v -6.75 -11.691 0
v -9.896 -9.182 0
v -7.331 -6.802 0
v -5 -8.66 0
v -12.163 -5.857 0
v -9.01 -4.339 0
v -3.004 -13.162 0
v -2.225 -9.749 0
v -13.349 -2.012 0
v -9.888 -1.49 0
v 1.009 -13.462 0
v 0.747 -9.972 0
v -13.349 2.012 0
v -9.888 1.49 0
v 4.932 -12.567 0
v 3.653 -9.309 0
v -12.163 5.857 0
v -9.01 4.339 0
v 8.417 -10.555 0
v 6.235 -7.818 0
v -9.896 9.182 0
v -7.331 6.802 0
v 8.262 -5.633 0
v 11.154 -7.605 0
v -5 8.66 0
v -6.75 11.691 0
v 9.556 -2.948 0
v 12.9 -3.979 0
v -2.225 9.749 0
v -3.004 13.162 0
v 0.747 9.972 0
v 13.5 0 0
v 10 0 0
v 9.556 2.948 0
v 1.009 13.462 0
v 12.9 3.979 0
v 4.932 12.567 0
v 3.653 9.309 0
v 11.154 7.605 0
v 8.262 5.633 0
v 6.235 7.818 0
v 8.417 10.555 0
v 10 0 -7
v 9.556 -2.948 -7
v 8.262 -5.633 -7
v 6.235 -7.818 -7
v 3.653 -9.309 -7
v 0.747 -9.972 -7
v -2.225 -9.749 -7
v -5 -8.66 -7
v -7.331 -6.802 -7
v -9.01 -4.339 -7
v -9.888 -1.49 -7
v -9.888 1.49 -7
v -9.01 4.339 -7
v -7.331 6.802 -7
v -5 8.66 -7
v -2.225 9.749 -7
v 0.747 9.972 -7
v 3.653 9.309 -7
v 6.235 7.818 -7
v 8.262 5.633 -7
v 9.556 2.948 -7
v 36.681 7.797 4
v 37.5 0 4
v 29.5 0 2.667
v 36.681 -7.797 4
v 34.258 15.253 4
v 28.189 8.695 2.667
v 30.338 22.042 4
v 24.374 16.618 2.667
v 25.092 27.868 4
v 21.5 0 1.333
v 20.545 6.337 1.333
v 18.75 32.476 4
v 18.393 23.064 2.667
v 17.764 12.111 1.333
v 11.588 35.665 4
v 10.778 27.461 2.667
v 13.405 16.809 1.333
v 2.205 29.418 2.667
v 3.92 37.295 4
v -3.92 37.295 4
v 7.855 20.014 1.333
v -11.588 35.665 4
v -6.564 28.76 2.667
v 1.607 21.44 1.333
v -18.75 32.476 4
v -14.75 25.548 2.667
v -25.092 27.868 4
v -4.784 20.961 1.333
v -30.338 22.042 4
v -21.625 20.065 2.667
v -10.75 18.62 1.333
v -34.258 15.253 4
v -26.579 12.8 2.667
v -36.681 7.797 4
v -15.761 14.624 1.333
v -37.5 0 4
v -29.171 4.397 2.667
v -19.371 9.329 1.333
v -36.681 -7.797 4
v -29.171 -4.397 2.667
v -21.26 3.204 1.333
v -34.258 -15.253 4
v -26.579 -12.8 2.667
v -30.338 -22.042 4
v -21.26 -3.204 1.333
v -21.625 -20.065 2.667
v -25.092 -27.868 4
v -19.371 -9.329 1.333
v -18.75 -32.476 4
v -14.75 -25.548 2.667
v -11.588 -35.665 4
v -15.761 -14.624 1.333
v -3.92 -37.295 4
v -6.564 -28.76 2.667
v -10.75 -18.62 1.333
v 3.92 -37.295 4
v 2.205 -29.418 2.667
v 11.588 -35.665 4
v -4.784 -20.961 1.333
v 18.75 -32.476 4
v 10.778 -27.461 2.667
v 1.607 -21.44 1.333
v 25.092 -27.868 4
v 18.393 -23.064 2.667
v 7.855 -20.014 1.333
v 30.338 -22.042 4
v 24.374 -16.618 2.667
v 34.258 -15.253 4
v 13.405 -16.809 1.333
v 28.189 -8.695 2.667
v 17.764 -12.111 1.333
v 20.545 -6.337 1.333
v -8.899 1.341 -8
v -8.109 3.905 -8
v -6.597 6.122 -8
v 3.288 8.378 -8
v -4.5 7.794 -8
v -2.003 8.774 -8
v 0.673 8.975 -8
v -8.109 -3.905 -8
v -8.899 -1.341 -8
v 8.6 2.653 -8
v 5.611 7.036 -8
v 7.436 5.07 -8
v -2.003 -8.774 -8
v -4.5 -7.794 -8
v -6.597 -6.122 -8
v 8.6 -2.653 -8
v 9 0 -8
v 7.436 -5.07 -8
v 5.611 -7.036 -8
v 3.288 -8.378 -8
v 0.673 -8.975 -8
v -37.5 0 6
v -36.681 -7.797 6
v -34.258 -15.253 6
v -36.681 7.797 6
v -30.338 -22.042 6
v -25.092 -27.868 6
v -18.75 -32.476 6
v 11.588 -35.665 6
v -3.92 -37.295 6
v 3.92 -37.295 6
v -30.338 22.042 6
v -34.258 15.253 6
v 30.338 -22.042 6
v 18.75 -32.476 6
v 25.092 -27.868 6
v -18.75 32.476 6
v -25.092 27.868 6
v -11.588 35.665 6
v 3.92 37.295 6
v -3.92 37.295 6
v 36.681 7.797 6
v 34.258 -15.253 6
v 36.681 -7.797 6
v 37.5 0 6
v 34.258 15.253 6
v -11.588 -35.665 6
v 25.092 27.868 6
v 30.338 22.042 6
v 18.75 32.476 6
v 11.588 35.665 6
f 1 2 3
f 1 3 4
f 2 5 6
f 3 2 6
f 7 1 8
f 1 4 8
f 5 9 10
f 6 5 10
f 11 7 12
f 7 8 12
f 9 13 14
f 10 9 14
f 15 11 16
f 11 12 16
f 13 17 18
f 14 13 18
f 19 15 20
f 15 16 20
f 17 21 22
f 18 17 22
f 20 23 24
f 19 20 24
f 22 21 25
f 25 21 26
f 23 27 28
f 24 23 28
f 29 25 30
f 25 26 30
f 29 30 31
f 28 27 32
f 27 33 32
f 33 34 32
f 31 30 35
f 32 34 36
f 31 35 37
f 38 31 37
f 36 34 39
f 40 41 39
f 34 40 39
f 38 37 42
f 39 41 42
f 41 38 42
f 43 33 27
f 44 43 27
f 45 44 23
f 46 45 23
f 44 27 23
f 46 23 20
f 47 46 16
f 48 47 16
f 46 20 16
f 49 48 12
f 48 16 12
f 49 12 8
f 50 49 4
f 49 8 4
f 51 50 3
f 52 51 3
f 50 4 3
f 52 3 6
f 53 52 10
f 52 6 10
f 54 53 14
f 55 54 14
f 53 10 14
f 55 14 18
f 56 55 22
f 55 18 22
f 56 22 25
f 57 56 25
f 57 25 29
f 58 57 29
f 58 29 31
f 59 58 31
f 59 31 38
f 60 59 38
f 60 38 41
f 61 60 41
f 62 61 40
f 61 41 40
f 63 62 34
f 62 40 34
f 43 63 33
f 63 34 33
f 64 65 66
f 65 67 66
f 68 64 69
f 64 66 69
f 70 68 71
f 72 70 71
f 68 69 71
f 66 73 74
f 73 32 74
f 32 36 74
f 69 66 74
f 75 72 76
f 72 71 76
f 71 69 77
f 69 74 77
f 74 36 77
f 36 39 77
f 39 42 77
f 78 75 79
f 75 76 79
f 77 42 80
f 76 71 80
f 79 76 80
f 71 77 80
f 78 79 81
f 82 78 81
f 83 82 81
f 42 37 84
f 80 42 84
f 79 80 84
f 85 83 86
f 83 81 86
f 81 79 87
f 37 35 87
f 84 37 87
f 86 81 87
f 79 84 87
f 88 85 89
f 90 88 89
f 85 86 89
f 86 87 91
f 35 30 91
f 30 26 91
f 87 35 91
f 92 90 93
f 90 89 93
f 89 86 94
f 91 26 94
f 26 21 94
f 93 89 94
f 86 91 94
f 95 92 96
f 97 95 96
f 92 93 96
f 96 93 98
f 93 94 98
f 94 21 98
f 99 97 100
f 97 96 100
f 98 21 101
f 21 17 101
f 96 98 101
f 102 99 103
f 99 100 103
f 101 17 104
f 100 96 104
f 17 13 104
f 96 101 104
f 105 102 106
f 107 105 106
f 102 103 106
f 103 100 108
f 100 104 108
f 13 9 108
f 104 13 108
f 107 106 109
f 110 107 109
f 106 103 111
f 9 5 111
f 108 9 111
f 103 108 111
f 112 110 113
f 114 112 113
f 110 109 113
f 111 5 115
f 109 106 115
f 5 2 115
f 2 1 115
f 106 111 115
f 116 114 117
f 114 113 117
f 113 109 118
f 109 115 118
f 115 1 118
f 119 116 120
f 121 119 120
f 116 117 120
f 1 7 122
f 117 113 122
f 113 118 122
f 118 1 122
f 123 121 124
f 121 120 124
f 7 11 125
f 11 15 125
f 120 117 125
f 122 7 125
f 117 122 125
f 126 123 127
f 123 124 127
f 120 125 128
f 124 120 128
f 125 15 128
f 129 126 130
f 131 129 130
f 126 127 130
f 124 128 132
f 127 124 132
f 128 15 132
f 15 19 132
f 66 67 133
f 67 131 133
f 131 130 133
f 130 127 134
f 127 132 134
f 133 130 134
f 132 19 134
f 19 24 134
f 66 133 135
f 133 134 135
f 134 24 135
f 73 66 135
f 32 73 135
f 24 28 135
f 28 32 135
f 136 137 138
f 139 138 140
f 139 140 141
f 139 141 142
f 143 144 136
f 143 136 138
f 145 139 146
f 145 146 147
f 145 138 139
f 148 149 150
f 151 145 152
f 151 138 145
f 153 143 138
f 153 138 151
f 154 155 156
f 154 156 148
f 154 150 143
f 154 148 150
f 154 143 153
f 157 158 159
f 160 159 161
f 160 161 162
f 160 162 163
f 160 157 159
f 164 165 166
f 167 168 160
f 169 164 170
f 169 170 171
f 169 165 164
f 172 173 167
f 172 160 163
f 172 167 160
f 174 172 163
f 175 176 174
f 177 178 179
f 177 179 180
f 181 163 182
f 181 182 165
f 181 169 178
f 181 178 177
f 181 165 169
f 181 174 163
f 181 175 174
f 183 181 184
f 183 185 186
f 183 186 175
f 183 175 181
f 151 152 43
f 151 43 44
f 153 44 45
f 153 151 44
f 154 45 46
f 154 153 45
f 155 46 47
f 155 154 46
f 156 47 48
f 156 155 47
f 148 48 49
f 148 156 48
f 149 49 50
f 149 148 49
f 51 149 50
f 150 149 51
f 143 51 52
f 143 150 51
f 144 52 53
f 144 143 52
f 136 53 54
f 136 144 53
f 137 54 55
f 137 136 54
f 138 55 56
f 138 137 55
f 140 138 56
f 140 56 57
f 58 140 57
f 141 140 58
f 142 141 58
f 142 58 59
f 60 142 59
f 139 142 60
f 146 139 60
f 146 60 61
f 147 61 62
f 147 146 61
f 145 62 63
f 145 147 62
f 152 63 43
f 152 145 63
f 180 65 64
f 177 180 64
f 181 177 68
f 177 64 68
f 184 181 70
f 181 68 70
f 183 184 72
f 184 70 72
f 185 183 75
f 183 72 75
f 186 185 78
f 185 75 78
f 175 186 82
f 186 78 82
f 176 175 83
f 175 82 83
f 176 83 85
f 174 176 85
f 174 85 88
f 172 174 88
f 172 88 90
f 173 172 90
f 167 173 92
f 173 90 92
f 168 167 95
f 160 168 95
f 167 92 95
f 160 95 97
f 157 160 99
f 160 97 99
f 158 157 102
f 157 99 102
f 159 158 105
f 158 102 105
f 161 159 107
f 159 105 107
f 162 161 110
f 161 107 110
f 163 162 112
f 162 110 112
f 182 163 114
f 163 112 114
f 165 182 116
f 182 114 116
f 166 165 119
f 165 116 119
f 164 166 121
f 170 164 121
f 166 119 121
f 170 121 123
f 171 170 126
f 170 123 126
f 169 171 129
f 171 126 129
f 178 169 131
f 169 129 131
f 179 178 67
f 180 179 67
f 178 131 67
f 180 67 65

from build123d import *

# Parameters (mm, degrees)
F0_R     = 37.5
F1_DEPTH = 6
F2_SIZE2 = 24
F2_SIZE  = 4
F3_R     = 10
F4_DEPTH = 8
F5_SIZE  = 1


with BuildPart() as f1:
    # F0 (on Top) → F1 (new body)
    with BuildSketch(Plane.XY):
        Circle(F0_R)
    extrude(amount=F1_DEPTH)

    # F2
    f2_edges = [f1.edges().sort_by_distance(p)[0] for p in [
        (-37.5, 0, 0),
    ]]
    chamfer(f2_edges, length=F2_SIZE, length2=F2_SIZE2)

    # F3 (on face) → F4 (join)
    with BuildSketch(Plane(origin=(0, 0, 0), x_dir=(1, 0, 0), z_dir=(0, 0, -1))):
        Circle(F3_R)
    extrude(amount=F4_DEPTH)

    # F5
    f5_edges = [f1.edges().sort_by_distance(p)[0] for p in [
        (-10, 0, -8),
    ]]
    chamfer(f5_edges, length=F5_SIZE)


solid = f1.part
